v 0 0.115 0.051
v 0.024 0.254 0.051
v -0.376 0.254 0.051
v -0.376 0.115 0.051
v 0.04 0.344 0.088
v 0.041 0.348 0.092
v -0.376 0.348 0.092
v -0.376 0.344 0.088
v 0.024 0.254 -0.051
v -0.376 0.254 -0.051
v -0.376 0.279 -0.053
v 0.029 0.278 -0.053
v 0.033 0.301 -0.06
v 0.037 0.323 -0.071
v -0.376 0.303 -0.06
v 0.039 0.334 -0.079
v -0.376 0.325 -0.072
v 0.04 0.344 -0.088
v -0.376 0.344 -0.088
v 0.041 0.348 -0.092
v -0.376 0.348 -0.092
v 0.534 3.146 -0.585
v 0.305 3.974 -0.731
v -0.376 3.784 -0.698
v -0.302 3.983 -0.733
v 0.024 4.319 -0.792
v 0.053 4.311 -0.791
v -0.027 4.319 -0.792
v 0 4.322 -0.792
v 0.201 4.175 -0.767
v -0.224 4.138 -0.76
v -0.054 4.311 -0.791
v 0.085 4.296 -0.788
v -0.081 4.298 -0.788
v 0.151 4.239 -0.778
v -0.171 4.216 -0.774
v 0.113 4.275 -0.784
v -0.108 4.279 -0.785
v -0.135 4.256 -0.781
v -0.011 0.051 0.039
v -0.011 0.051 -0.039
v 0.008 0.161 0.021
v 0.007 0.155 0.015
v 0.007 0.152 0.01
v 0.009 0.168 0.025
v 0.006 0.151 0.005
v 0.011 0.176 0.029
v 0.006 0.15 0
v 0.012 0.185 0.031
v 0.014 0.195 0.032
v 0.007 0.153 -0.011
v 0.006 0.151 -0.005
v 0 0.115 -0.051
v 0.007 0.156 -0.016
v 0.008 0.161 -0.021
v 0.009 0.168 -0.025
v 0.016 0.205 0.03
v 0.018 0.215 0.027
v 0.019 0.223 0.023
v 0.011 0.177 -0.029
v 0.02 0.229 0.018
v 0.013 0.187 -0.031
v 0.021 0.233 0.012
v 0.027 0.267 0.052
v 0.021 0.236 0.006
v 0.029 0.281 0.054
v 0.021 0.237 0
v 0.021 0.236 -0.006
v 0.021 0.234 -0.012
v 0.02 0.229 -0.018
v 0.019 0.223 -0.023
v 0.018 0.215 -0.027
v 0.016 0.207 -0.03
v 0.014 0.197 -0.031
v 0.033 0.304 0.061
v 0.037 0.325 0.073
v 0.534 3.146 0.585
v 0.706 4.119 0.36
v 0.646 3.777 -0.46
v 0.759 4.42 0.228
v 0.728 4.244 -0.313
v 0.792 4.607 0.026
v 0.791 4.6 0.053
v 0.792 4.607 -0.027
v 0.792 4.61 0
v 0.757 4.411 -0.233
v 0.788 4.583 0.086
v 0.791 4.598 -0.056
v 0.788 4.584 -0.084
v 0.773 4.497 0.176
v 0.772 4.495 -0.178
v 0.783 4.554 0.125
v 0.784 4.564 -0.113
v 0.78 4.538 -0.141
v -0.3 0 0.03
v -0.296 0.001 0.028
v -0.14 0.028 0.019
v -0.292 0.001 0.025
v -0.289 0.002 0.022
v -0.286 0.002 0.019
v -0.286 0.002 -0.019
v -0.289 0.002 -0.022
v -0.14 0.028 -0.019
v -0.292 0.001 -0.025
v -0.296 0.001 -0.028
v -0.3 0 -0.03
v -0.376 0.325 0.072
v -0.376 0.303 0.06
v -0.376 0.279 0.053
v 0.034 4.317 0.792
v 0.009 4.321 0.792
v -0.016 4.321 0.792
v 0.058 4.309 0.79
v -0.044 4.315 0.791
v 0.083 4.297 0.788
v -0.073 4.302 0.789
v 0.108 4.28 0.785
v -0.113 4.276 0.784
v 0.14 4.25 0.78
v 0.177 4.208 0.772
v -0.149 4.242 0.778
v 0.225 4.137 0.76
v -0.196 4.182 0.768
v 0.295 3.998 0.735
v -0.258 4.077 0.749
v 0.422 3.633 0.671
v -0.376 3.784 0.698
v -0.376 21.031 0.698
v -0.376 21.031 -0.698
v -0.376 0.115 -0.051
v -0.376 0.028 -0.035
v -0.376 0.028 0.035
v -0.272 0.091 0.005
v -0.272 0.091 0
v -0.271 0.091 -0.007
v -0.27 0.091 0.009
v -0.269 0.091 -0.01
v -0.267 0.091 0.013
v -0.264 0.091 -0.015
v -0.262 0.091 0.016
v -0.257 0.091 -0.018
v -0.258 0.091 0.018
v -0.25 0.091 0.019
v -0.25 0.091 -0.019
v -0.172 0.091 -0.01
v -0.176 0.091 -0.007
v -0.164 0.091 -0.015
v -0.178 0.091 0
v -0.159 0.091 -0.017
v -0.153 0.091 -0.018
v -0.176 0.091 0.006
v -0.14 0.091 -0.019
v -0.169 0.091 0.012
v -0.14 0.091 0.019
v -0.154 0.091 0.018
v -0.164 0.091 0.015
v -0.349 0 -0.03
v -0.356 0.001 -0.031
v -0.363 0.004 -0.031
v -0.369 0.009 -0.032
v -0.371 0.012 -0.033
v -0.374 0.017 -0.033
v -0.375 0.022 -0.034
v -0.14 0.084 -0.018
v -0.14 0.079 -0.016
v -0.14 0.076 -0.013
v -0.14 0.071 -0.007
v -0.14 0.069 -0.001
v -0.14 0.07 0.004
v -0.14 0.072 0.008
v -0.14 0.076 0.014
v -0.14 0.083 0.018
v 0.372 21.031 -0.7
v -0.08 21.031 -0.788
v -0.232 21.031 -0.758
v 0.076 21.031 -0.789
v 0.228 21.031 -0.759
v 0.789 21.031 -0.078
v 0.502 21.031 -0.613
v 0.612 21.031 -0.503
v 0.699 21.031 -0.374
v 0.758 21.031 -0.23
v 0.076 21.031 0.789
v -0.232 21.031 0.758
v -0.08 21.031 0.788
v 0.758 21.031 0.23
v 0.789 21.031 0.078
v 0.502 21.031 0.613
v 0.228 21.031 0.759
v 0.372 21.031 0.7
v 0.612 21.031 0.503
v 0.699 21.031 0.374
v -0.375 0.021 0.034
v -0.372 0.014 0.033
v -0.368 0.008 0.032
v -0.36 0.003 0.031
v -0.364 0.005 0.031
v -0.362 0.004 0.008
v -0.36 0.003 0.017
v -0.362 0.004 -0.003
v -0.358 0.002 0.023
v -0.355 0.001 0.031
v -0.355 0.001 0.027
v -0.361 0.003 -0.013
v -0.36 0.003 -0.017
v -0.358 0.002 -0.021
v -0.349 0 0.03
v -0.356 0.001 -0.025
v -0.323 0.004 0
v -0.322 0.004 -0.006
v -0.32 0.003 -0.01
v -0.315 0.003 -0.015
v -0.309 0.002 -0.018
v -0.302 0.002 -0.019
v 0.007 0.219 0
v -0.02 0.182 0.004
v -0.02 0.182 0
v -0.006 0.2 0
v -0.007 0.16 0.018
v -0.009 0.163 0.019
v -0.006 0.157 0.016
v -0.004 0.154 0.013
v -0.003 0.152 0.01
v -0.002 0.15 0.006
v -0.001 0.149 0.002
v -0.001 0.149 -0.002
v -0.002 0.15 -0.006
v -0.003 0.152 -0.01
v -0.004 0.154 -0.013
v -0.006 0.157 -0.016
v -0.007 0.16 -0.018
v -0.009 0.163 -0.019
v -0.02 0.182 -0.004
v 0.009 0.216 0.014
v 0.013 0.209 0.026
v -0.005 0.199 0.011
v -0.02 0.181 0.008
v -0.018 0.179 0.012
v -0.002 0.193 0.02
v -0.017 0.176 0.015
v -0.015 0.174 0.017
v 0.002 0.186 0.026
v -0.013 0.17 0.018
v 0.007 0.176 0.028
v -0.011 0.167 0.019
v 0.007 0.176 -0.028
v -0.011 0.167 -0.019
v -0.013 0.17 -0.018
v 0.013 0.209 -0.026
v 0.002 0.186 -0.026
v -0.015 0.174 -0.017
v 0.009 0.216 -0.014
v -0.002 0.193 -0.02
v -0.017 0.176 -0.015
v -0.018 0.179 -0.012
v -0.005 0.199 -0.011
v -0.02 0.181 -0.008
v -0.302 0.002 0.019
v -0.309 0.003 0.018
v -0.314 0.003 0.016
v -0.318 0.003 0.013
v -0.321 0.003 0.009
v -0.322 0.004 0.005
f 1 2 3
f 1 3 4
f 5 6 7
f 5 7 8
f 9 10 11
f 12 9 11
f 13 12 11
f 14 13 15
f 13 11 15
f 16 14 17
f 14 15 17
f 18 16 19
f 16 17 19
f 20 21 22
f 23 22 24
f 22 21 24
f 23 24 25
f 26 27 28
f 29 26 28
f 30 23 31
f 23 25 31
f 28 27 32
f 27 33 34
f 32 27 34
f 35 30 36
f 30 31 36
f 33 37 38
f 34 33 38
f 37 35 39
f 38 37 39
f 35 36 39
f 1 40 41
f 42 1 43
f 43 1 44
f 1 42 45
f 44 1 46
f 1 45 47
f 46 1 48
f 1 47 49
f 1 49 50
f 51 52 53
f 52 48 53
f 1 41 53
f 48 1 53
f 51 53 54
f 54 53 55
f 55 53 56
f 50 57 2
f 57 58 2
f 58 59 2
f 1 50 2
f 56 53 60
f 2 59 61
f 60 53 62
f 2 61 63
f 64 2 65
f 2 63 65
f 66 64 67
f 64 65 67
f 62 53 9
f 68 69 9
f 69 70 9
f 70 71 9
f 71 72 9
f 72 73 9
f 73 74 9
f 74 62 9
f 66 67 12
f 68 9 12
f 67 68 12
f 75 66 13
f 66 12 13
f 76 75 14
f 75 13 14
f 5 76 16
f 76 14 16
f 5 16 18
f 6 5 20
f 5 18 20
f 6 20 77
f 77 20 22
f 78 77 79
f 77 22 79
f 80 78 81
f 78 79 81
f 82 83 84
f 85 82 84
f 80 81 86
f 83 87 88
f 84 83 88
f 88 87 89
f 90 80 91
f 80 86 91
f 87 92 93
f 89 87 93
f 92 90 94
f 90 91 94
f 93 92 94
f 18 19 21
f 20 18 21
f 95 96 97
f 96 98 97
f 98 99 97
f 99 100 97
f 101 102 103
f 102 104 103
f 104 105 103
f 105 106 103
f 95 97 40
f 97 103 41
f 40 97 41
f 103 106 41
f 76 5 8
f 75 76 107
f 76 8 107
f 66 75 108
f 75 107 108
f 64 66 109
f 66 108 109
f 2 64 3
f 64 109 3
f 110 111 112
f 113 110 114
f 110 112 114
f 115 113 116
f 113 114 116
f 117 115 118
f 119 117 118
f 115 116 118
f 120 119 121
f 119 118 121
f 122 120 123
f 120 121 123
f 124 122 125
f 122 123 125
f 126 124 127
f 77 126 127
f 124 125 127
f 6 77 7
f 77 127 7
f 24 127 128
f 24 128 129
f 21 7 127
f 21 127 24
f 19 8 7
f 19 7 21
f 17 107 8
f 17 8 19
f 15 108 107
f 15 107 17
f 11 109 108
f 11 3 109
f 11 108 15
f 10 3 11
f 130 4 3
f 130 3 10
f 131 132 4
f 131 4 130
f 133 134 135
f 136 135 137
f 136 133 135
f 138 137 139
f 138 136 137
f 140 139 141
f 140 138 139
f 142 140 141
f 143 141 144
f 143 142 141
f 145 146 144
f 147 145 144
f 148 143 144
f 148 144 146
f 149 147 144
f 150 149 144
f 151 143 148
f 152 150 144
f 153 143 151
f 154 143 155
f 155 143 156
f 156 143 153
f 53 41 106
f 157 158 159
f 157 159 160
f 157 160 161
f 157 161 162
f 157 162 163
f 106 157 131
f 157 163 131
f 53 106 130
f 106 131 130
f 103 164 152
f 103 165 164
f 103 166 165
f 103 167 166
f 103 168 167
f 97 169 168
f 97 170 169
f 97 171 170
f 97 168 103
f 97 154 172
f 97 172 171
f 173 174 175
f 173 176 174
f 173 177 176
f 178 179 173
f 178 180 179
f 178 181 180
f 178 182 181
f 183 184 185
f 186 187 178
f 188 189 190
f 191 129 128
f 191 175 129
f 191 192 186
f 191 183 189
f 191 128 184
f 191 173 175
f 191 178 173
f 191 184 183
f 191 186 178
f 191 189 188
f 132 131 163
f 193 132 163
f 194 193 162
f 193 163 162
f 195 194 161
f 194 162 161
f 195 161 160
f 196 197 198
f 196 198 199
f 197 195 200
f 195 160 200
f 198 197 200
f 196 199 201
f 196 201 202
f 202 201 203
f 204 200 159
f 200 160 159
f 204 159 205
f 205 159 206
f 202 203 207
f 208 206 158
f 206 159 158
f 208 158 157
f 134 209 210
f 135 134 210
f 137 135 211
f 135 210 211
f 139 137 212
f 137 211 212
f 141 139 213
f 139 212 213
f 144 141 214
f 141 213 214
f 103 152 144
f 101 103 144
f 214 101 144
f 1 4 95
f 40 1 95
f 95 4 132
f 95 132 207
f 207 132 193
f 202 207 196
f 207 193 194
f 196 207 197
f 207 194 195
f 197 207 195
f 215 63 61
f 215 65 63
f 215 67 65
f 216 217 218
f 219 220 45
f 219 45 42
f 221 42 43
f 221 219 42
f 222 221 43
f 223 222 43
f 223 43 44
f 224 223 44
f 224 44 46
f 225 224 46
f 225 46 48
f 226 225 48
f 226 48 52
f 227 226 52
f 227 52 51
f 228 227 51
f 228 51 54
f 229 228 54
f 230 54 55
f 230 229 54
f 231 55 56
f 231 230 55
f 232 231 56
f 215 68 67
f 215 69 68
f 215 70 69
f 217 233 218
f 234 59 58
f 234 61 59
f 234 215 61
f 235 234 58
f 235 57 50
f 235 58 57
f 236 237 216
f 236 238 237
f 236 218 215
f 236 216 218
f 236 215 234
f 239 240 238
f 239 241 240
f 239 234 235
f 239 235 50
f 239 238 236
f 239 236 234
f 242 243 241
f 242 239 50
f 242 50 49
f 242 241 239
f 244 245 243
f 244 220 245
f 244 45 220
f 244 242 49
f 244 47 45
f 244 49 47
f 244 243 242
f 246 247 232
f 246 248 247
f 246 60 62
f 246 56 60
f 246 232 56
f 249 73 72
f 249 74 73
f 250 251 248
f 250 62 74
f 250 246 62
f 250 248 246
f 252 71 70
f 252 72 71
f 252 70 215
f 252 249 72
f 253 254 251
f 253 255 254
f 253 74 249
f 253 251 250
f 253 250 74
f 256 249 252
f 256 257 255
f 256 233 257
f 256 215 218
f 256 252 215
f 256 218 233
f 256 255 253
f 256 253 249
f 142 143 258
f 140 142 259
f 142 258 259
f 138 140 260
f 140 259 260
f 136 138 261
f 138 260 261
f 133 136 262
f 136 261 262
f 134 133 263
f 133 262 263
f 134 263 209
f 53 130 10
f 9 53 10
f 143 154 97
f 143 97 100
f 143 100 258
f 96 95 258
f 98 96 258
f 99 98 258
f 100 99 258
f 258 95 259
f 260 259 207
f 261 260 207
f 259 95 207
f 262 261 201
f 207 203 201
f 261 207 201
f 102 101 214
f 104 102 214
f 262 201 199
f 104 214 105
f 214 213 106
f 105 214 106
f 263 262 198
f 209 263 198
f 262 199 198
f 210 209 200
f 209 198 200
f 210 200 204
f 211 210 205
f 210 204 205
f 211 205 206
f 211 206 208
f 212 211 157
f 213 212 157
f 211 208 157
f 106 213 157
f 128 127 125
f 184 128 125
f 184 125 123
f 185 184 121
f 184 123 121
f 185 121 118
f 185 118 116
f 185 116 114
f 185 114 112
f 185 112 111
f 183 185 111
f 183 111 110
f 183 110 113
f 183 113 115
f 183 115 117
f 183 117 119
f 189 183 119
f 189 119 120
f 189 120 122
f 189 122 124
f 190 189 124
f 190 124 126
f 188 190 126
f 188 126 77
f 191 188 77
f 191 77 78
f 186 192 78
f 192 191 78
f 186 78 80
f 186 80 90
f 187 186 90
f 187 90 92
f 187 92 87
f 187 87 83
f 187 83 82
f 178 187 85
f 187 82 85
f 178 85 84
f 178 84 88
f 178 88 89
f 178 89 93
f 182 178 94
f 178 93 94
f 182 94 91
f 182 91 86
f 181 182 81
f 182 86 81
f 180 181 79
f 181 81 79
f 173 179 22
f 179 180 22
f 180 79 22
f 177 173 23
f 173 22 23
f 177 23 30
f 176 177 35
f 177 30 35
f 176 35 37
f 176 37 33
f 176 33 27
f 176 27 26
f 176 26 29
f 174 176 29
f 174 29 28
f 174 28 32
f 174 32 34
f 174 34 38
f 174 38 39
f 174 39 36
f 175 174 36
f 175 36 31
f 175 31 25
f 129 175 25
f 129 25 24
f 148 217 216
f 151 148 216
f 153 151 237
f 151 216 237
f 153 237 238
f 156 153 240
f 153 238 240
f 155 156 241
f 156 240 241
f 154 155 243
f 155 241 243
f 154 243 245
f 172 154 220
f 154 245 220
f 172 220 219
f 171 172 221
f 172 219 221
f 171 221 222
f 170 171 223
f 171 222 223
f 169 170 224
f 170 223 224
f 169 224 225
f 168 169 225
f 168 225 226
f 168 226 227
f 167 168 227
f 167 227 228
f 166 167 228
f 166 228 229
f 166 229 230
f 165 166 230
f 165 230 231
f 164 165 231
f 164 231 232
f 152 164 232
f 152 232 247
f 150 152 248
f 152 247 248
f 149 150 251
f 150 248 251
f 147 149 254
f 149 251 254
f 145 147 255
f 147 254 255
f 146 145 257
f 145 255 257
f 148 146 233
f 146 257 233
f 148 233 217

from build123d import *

# Parameters (mm, degrees)
TD_SKETCH_R                             = 0.79248
TL_FEATURE_DEPTH                        = 21.0312
TDF_STD_SKETCH_W                        = 2.09296
TDF_STD_SKETCH_H                        = 2.09296
TDF_STD_FEATURE_DEPTH                   = 22.061040395
ISA_20_STD_FEATURE_DEPTH                = 22.061040395
ISA_20_STD_FEATURE_DEPTH_BACK           = 22.061040395
VW_STD_FEATURE_DEPTH                    = 22.061040395
VW_STD_FEATURE_DEPTH_BACK               = 22.061040395
F_10BA_STD_FEATURE_DEPTH                = 22.061040503
F_10BA_STD_FEATURE_DEPTH_BACK           = 22.061040503
FRO_STD_FEATURE_DEPTH                   = 22.061040395
FRO_STD_FEATURE_DEPTH_BACK              = 22.061040395
C_STD_FEATURE_DEPTH                     = 22.061040395
C_STD_FEATURE_DEPTH_BACK                = 22.061040395
ERW_STD_FEATURE_DEPTH                   = 0.01905
H_STD_FEATURE_REACH                     = 22.896
H_STD_SKETCH_R                          = 0.01905
H_STD_SKETCH_3_R                        = 0.01905
FUNNEL_FINAL_DIAMETRE_STD_FEATURE_DEPTH = 2.499995
FUNNEL_FINAL_DIAMETRE_STD_FEATURE_DRAFT = -22.5
ROUND_BR_STD_FEATURE_START              = -1
ROUND_BR_STD_FEATURE_DEPTH              = 1.009339363


with BuildPart() as part:
    # TD_sketch → TL_feature (new body)
    with BuildSketch(Plane(origin=(0, 0, 0), x_dir=(1, 0, 0), z_dir=(0, 1, 0))):
        with Locations(Location((0, 0, 0), (0, 0, 270))):
            Circle(TD_SKETCH_R)
    extrude(amount=TL_FEATURE_DEPTH)

    # TDF_STD_sketch → TDF_STD_feature (cut, through all)
    with BuildSketch(Plane(origin=(0, 0, 0), x_dir=(1, 0, 0), z_dir=(0, 1, 0))):
        with Locations((-1.4224, 0)):
            Rectangle(TDF_STD_SKETCH_W, TDF_STD_SKETCH_H)
    extrude(amount=TDF_STD_FEATURE_DEPTH, mode=Mode.SUBTRACT)

    # ISA_20_STD_sketch → ISA_20_STD_feature (cut, two sides: drawn at the far end of the back side and taken through both)
    with BuildSketch(Plane(origin=(0, 0, 0), x_dir=(0, 0, -1), z_dir=(1, 0, 0)).offset(-ISA_20_STD_FEATURE_DEPTH_BACK)):
        Polygon((-12.946999885, 73.253224398), (-3.738847997, 21.0312), (-0.03048, 0), (0.03048, 0), (3.738847997, 21.0312), (12.946999885, 73.253224398), (12.946999885, -32.802042202), (-12.946999885, -32.802042202), align=None)
    extrude(amount=ISA_20_STD_FEATURE_DEPTH + ISA_20_STD_FEATURE_DEPTH_BACK, mode=Mode.SUBTRACT)

    # VW_STD_sketch → VW_STD_feature (cut, two sides: drawn at the far end of the back side and taken through both)
    with BuildSketch(Plane(origin=(0, 0, 0), x_dir=(0, 0, -1), z_dir=(1, 0, 0)).offset(-VW_STD_FEATURE_DEPTH_BACK)):
        with BuildLine():
            Line((-70.448918022, 70.704723144), (-20.775394878, 21.0312))
            Line((-20.775394878, 21.0312), (-0.087997439, 0.343802561))
            ThreePointArc((-0.087997439, 0.343802561), (-0.060467299, 0.302600796), (-0.0508, 0.254))
            Line((-0.0508, 0.254), (-0.0508, 0))
            Line((-0.0508, 0), (0.0508, 0))
            Line((0.0508, 0), (0.0508, 0.254))
            ThreePointArc((0.0508, 0.254), (0.060467299, 0.302600796), (0.087997439, 0.343802561))
            Line((0.087997439, 0.343802561), (20.775394878, 21.0312))
            Line((20.775394878, 21.0312), (70.448918022, 70.704723144))
            Line((70.448918022, 70.704723144), (70.448918022, -69.793217099))
            Line((70.448918022, -69.793217099), (-70.448918022, -69.793217099))
            Line((-70.448918022, -69.793217099), (-70.448918022, 70.704723144))
        make_face()
    extrude(amount=VW_STD_FEATURE_DEPTH + VW_STD_FEATURE_DEPTH_BACK, mode=Mode.SUBTRACT)

    # 10BA_STD_sketch → 10BA_STD_feature (cut, two sides: drawn at the far end of the back side and taken through both)
    with BuildSketch(Plane.XY.offset(-F_10BA_STD_FEATURE_DEPTH_BACK)):
        Polygon((-53.216424868, 0), (-0.37592, 0), (-0.29972, 0), (-0.011354365, 0.050846642), (3.688047997, 21.0312), (12.863705374, 73.068938867), (91.245890155, 2.183757568), (25.165759913, -70.885181299), align=None)
    extrude(amount=F_10BA_STD_FEATURE_DEPTH + F_10BA_STD_FEATURE_DEPTH_BACK, mode=Mode.SUBTRACT)

    # FRO_STD_sketch → FRO_STD_feature (cut, two sides: drawn at the far end of the back side and taken through both)
    with BuildSketch(Plane.XY.offset(-FRO_STD_FEATURE_DEPTH_BACK)):
        with BuildLine():
            Line((-0.37592, 52.152138388), (-0.37592, 0.02794))
            ThreePointArc((-0.37592, 0.02794), (-0.367736563, 0.008183437), (-0.34798, 0))
            Line((-0.34798, 0), (51.776218388, 0))
            Line((51.776218388, 0), (-21.9385299, -73.714748288))
            Line((-21.9385299, -73.714748288), (-74.090668288, -21.5626099))
            Line((-74.090668288, -21.5626099), (-0.37592, 52.152138388))
        make_face()
    extrude(amount=FRO_STD_FEATURE_DEPTH + FRO_STD_FEATURE_DEPTH_BACK, mode=Mode.SUBTRACT)

    # C_STD_sketch → C_STD_feature (cut, two sides: drawn at the far end of the back side and taken through both)
    with BuildSketch(Plane(origin=(0, 0, 0), x_dir=(0, 0, -1), z_dir=(1, 0, 0)).offset(-C_STD_FEATURE_DEPTH_BACK)):
        with BuildLine():
            Line((-50.530423385, -12.791040855), (-0.030559272, 0))
            ThreePointArc((-0.030559272, 0), (0, 0.00381), (0.030559272, 0))
            Line((0.030559272, 0), (50.530423385, -12.791040855))
            Line((50.530423385, -12.791040855), (50.530423385, -116.980234183))
            Line((50.530423385, -116.980234183), (-50.530423385, -116.980234183))
            Line((-50.530423385, -116.980234183), (-50.530423385, -12.791040855))
        make_face()
    extrude(amount=C_STD_FEATURE_DEPTH + C_STD_FEATURE_DEPTH_BACK, mode=Mode.SUBTRACT)


with BuildPart() as body_2:
    # ERW_STD_sketch → ERW_STD_feature (new, symmetric)
    with BuildSketch(Plane.XY):
        Polygon((-0.1397, 0.09144), (-0.1397, 0), (-0.32512, 0), (-0.272327091, 0.09144), align=None)
    extrude(amount=ERW_STD_FEATURE_DEPTH, both=True)

    # H_STD_sketch → H_STD_feature (add, up to next)
    with BuildSketch(Plane(origin=(-0.010897713, 0.165804035, 0), x_dir=(0, 0, -1), z_dir=(0.8660254037844415, 0.4999999999999953, 0)), mode=Mode.PRIVATE) as h_std_feature_sk1:
        with Locations(Location((0, 0, 0), (0, 0, 90))):
            Circle(H_STD_SKETCH_R)
    h_std_feature_tool1 = extrude(h_std_feature_sk1.sketch, amount=-H_STD_FEATURE_REACH, mode=Mode.PRIVATE) - body_2.part
    add(h_std_feature_tool1.solids().sort_by_distance((-0.010898, 0.165804, 0))[0])


with BuildPart() as funnel_final_diametre_std_feature_tool:
    # H_STD_sketch<3> → funnel_final_diametre_STD_feature (with draft: the straight prism first)
    with BuildSketch(Plane(origin=(-0.010897713, 0.165804035, 0), x_dir=(0, 0, -1), z_dir=(0.8660254037844415, 0.4999999999999953, 0))):
        with Locations(Location((0, 0, 0), (0, 0, 90))):
            Circle(H_STD_SKETCH_3_R)
    extrude(amount=FUNNEL_FINAL_DIAMETRE_STD_FEATURE_DEPTH)
    # funnel_final_diametre_STD_feature: the draft: its side faces are tilted about the plane it starts from
    funnel_final_diametre_std_feature_sides = [funnel_final_diametre_std_feature_tool.faces().sort_by_distance(p)[0] for p in [
        (1.081156877, 0.774305001, 0),
    ]]
    draft(funnel_final_diametre_std_feature_sides, Plane(origin=(-0.010897713, 0.165804035, 0), x_dir=(0, 0, -1), z_dir=(0.8660254037844415, 0.4999999999999953, 0)), FUNNEL_FINAL_DIAMETRE_STD_FEATURE_DRAFT)


with BuildPart() as body_2_1:
    add(body_2.part)

    # funnel_final_diametre_STD_feature: add funnel_final_diametre_std_feature_tool
    add(funnel_final_diametre_std_feature_tool.part)

    # ROUND_BR_STD_feature: read off the stored shape, not the designer's step
    # ROUND_BR_STD_feature outline → ROUND_BR_STD_feature (cut)
    with BuildSketch(Plane(origin=(0, 0, 0), x_dir=(0.8660254037844362, -0.5000000000000042, 0), z_dir=(0.5000000000000042, 0.8660254037844363, 0)).offset(ROUND_BR_STD_FEATURE_START)):
        with BuildLine():
            Line((-0.281562179, -0.01905), (-0.262512179, -0.01905))
            ThreePointArc((-0.262512179, -0.01905), (-0.275982563, -0.013470384), (-0.281562179, 0))
            Line((-0.281562179, 0), (-0.281562179, -0.01905))
        make_face()
        with BuildLine():
            Line((-0.281562179, 0.01905), (-0.281562179, 0))
            ThreePointArc((-0.281562179, 0), (-0.275982563, 0.013470384), (-0.262512179, 0.01905))
            Line((-0.262512179, 0.01905), (-0.281562179, 0.01905))
        make_face()
    extrude(amount=ROUND_BR_STD_FEATURE_DEPTH, mode=Mode.SUBTRACT)


with BuildPart() as part_1:
    add(part.part)

    # COMBINE_STD_feature: cut body 2
    add(body_2_1.part, mode=Mode.SUBTRACT)


solid = part_1.part
